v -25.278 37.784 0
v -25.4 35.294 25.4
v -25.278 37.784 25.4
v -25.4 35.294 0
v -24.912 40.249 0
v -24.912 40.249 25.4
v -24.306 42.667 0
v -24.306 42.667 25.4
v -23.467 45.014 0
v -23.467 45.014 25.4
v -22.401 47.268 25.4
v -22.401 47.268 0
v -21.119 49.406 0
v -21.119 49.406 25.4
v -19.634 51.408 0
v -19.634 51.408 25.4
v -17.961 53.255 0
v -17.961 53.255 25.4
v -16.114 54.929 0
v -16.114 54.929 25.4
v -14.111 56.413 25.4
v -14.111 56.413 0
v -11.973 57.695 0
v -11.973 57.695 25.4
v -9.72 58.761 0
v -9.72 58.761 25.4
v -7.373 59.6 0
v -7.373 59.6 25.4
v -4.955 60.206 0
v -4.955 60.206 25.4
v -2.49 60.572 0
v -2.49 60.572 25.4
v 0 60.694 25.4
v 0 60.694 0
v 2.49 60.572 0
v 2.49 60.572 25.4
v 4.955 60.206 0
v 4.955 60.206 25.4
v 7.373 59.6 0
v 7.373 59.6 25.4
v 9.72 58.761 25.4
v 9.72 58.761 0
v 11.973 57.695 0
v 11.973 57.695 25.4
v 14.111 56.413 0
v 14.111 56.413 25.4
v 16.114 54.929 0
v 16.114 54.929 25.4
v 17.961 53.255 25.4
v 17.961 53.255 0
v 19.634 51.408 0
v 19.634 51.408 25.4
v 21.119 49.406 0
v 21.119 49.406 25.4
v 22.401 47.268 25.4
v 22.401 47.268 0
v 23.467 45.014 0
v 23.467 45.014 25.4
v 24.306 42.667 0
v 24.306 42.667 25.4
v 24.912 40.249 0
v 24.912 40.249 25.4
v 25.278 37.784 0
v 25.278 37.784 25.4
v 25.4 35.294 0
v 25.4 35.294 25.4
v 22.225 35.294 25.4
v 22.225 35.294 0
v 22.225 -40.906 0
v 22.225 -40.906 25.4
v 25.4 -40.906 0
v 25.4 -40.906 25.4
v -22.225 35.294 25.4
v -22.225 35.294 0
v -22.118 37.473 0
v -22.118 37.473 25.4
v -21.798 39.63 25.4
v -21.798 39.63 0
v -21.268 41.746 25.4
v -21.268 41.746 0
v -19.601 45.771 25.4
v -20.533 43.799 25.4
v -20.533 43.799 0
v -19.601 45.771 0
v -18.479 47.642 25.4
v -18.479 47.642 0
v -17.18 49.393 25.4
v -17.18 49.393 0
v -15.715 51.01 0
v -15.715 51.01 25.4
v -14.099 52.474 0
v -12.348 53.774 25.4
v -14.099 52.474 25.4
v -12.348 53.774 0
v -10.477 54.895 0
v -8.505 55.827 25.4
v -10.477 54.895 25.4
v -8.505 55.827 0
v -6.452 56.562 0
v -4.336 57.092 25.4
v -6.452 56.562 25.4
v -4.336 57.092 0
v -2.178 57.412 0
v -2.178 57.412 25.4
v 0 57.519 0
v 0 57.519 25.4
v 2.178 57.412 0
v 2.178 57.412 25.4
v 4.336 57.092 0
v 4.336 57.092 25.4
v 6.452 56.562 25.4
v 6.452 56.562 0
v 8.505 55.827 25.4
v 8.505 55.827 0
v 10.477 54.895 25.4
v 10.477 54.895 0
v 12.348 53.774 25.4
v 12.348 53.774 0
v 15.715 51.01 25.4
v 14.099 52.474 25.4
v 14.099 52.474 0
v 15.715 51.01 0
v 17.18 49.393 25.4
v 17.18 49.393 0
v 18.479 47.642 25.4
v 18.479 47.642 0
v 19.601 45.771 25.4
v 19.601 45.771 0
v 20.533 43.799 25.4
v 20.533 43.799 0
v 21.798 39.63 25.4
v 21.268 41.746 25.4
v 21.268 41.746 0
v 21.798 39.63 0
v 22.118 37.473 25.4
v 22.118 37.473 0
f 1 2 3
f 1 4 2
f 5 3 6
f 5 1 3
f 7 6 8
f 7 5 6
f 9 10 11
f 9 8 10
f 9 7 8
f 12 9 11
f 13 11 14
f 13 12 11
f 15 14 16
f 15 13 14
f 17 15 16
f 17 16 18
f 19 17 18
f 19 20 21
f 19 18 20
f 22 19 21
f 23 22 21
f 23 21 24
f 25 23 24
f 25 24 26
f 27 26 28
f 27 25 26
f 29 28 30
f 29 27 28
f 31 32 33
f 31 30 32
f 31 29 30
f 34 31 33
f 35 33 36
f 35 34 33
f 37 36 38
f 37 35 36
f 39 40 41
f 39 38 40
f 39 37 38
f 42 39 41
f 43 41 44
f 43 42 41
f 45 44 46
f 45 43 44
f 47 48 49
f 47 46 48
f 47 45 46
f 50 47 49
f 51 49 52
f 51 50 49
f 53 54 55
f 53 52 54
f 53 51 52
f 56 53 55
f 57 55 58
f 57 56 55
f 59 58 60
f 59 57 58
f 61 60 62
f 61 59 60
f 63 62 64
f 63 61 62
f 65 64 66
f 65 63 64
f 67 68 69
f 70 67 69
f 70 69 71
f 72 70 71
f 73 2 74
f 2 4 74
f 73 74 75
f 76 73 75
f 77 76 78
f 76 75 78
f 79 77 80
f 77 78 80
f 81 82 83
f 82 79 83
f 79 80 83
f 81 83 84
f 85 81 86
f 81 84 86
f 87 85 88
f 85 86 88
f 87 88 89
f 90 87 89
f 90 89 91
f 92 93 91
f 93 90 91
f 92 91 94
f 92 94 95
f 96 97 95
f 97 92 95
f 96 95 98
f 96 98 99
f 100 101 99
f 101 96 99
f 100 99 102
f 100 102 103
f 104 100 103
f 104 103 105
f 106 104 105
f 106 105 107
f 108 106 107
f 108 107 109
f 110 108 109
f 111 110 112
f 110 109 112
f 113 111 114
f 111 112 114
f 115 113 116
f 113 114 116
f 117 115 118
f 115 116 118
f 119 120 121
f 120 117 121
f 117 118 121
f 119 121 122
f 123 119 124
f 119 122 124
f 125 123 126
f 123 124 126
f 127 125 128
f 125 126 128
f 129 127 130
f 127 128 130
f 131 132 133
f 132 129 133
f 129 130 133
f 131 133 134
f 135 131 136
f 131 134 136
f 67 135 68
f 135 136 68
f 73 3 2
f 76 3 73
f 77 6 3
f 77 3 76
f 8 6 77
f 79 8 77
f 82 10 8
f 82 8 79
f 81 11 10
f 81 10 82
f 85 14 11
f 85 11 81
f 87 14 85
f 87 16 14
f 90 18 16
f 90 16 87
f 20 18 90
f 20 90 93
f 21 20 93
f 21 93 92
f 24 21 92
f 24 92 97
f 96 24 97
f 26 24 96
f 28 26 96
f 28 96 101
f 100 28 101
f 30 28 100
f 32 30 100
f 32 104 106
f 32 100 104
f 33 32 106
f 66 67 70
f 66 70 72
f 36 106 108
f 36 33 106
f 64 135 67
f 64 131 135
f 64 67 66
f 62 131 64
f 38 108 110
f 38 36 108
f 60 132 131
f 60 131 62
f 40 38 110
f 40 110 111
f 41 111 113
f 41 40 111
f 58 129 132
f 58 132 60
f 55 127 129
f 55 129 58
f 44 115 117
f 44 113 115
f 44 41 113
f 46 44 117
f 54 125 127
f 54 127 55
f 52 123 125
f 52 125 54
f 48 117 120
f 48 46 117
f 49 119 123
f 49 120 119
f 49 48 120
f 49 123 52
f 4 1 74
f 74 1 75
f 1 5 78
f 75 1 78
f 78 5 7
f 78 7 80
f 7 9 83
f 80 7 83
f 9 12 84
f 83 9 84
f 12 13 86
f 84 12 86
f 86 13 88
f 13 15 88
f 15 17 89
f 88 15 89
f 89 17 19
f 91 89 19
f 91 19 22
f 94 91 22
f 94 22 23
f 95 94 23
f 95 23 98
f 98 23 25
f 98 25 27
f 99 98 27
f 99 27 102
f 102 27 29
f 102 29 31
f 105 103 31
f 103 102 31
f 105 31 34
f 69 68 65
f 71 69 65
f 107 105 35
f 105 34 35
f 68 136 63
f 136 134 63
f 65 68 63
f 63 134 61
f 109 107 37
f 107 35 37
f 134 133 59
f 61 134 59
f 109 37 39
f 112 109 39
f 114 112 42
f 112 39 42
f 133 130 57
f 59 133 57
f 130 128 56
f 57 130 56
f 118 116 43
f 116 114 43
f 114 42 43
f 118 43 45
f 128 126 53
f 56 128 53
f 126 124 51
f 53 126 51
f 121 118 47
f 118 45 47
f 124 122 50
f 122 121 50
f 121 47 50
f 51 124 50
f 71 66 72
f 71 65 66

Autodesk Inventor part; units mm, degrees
ref_plane "YZ Plane" through (0, 0, 0) normal (1, 0, 0) x (0, 1, 0)
ref_plane "XZ Plane" through (0, 0, 0) normal (0, 1, 0) x (-1, 0, 0)
ref_plane "XY Plane" through (0, 0, 0) normal (0, 0, 1) x (1, 0, 0)
sketch "Sketch1" plane through (0, 0, 0) normal (0, 0, 1) x (1, 0, 0)
  arc A0 (25.4, 35.2941) -> (-25.4, 35.2941) centre (0, 35.2941) ccw
  line L0 (25.4, 35.2941) -> (25.4, -40.9059)
  arc A1 (22.225, 35.2941) -> (-22.225, 35.2941) centre (0, 35.2941) ccw
  line L1 (22.225, 35.2941) -> (22.225, -40.9059)
  line L2 (22.225, -40.9059) -> (25.4, -40.9059)
  line L3 (22.225, 35.2941) -> (-22.225, 35.2941) construction
  line L4 (-25.4, 35.2941) -> (-22.225, 35.2941)
  point P0 (0, 0)
  dimension "d0" = 50.8
  dimension "d2" = 76.2
  dimension "d3" = 44.45
extrude "Extrusion1" add sketch "Sketch1" along normal blind 25.4
properties part number "Hook 2.0" material "Aluminum 6061"
